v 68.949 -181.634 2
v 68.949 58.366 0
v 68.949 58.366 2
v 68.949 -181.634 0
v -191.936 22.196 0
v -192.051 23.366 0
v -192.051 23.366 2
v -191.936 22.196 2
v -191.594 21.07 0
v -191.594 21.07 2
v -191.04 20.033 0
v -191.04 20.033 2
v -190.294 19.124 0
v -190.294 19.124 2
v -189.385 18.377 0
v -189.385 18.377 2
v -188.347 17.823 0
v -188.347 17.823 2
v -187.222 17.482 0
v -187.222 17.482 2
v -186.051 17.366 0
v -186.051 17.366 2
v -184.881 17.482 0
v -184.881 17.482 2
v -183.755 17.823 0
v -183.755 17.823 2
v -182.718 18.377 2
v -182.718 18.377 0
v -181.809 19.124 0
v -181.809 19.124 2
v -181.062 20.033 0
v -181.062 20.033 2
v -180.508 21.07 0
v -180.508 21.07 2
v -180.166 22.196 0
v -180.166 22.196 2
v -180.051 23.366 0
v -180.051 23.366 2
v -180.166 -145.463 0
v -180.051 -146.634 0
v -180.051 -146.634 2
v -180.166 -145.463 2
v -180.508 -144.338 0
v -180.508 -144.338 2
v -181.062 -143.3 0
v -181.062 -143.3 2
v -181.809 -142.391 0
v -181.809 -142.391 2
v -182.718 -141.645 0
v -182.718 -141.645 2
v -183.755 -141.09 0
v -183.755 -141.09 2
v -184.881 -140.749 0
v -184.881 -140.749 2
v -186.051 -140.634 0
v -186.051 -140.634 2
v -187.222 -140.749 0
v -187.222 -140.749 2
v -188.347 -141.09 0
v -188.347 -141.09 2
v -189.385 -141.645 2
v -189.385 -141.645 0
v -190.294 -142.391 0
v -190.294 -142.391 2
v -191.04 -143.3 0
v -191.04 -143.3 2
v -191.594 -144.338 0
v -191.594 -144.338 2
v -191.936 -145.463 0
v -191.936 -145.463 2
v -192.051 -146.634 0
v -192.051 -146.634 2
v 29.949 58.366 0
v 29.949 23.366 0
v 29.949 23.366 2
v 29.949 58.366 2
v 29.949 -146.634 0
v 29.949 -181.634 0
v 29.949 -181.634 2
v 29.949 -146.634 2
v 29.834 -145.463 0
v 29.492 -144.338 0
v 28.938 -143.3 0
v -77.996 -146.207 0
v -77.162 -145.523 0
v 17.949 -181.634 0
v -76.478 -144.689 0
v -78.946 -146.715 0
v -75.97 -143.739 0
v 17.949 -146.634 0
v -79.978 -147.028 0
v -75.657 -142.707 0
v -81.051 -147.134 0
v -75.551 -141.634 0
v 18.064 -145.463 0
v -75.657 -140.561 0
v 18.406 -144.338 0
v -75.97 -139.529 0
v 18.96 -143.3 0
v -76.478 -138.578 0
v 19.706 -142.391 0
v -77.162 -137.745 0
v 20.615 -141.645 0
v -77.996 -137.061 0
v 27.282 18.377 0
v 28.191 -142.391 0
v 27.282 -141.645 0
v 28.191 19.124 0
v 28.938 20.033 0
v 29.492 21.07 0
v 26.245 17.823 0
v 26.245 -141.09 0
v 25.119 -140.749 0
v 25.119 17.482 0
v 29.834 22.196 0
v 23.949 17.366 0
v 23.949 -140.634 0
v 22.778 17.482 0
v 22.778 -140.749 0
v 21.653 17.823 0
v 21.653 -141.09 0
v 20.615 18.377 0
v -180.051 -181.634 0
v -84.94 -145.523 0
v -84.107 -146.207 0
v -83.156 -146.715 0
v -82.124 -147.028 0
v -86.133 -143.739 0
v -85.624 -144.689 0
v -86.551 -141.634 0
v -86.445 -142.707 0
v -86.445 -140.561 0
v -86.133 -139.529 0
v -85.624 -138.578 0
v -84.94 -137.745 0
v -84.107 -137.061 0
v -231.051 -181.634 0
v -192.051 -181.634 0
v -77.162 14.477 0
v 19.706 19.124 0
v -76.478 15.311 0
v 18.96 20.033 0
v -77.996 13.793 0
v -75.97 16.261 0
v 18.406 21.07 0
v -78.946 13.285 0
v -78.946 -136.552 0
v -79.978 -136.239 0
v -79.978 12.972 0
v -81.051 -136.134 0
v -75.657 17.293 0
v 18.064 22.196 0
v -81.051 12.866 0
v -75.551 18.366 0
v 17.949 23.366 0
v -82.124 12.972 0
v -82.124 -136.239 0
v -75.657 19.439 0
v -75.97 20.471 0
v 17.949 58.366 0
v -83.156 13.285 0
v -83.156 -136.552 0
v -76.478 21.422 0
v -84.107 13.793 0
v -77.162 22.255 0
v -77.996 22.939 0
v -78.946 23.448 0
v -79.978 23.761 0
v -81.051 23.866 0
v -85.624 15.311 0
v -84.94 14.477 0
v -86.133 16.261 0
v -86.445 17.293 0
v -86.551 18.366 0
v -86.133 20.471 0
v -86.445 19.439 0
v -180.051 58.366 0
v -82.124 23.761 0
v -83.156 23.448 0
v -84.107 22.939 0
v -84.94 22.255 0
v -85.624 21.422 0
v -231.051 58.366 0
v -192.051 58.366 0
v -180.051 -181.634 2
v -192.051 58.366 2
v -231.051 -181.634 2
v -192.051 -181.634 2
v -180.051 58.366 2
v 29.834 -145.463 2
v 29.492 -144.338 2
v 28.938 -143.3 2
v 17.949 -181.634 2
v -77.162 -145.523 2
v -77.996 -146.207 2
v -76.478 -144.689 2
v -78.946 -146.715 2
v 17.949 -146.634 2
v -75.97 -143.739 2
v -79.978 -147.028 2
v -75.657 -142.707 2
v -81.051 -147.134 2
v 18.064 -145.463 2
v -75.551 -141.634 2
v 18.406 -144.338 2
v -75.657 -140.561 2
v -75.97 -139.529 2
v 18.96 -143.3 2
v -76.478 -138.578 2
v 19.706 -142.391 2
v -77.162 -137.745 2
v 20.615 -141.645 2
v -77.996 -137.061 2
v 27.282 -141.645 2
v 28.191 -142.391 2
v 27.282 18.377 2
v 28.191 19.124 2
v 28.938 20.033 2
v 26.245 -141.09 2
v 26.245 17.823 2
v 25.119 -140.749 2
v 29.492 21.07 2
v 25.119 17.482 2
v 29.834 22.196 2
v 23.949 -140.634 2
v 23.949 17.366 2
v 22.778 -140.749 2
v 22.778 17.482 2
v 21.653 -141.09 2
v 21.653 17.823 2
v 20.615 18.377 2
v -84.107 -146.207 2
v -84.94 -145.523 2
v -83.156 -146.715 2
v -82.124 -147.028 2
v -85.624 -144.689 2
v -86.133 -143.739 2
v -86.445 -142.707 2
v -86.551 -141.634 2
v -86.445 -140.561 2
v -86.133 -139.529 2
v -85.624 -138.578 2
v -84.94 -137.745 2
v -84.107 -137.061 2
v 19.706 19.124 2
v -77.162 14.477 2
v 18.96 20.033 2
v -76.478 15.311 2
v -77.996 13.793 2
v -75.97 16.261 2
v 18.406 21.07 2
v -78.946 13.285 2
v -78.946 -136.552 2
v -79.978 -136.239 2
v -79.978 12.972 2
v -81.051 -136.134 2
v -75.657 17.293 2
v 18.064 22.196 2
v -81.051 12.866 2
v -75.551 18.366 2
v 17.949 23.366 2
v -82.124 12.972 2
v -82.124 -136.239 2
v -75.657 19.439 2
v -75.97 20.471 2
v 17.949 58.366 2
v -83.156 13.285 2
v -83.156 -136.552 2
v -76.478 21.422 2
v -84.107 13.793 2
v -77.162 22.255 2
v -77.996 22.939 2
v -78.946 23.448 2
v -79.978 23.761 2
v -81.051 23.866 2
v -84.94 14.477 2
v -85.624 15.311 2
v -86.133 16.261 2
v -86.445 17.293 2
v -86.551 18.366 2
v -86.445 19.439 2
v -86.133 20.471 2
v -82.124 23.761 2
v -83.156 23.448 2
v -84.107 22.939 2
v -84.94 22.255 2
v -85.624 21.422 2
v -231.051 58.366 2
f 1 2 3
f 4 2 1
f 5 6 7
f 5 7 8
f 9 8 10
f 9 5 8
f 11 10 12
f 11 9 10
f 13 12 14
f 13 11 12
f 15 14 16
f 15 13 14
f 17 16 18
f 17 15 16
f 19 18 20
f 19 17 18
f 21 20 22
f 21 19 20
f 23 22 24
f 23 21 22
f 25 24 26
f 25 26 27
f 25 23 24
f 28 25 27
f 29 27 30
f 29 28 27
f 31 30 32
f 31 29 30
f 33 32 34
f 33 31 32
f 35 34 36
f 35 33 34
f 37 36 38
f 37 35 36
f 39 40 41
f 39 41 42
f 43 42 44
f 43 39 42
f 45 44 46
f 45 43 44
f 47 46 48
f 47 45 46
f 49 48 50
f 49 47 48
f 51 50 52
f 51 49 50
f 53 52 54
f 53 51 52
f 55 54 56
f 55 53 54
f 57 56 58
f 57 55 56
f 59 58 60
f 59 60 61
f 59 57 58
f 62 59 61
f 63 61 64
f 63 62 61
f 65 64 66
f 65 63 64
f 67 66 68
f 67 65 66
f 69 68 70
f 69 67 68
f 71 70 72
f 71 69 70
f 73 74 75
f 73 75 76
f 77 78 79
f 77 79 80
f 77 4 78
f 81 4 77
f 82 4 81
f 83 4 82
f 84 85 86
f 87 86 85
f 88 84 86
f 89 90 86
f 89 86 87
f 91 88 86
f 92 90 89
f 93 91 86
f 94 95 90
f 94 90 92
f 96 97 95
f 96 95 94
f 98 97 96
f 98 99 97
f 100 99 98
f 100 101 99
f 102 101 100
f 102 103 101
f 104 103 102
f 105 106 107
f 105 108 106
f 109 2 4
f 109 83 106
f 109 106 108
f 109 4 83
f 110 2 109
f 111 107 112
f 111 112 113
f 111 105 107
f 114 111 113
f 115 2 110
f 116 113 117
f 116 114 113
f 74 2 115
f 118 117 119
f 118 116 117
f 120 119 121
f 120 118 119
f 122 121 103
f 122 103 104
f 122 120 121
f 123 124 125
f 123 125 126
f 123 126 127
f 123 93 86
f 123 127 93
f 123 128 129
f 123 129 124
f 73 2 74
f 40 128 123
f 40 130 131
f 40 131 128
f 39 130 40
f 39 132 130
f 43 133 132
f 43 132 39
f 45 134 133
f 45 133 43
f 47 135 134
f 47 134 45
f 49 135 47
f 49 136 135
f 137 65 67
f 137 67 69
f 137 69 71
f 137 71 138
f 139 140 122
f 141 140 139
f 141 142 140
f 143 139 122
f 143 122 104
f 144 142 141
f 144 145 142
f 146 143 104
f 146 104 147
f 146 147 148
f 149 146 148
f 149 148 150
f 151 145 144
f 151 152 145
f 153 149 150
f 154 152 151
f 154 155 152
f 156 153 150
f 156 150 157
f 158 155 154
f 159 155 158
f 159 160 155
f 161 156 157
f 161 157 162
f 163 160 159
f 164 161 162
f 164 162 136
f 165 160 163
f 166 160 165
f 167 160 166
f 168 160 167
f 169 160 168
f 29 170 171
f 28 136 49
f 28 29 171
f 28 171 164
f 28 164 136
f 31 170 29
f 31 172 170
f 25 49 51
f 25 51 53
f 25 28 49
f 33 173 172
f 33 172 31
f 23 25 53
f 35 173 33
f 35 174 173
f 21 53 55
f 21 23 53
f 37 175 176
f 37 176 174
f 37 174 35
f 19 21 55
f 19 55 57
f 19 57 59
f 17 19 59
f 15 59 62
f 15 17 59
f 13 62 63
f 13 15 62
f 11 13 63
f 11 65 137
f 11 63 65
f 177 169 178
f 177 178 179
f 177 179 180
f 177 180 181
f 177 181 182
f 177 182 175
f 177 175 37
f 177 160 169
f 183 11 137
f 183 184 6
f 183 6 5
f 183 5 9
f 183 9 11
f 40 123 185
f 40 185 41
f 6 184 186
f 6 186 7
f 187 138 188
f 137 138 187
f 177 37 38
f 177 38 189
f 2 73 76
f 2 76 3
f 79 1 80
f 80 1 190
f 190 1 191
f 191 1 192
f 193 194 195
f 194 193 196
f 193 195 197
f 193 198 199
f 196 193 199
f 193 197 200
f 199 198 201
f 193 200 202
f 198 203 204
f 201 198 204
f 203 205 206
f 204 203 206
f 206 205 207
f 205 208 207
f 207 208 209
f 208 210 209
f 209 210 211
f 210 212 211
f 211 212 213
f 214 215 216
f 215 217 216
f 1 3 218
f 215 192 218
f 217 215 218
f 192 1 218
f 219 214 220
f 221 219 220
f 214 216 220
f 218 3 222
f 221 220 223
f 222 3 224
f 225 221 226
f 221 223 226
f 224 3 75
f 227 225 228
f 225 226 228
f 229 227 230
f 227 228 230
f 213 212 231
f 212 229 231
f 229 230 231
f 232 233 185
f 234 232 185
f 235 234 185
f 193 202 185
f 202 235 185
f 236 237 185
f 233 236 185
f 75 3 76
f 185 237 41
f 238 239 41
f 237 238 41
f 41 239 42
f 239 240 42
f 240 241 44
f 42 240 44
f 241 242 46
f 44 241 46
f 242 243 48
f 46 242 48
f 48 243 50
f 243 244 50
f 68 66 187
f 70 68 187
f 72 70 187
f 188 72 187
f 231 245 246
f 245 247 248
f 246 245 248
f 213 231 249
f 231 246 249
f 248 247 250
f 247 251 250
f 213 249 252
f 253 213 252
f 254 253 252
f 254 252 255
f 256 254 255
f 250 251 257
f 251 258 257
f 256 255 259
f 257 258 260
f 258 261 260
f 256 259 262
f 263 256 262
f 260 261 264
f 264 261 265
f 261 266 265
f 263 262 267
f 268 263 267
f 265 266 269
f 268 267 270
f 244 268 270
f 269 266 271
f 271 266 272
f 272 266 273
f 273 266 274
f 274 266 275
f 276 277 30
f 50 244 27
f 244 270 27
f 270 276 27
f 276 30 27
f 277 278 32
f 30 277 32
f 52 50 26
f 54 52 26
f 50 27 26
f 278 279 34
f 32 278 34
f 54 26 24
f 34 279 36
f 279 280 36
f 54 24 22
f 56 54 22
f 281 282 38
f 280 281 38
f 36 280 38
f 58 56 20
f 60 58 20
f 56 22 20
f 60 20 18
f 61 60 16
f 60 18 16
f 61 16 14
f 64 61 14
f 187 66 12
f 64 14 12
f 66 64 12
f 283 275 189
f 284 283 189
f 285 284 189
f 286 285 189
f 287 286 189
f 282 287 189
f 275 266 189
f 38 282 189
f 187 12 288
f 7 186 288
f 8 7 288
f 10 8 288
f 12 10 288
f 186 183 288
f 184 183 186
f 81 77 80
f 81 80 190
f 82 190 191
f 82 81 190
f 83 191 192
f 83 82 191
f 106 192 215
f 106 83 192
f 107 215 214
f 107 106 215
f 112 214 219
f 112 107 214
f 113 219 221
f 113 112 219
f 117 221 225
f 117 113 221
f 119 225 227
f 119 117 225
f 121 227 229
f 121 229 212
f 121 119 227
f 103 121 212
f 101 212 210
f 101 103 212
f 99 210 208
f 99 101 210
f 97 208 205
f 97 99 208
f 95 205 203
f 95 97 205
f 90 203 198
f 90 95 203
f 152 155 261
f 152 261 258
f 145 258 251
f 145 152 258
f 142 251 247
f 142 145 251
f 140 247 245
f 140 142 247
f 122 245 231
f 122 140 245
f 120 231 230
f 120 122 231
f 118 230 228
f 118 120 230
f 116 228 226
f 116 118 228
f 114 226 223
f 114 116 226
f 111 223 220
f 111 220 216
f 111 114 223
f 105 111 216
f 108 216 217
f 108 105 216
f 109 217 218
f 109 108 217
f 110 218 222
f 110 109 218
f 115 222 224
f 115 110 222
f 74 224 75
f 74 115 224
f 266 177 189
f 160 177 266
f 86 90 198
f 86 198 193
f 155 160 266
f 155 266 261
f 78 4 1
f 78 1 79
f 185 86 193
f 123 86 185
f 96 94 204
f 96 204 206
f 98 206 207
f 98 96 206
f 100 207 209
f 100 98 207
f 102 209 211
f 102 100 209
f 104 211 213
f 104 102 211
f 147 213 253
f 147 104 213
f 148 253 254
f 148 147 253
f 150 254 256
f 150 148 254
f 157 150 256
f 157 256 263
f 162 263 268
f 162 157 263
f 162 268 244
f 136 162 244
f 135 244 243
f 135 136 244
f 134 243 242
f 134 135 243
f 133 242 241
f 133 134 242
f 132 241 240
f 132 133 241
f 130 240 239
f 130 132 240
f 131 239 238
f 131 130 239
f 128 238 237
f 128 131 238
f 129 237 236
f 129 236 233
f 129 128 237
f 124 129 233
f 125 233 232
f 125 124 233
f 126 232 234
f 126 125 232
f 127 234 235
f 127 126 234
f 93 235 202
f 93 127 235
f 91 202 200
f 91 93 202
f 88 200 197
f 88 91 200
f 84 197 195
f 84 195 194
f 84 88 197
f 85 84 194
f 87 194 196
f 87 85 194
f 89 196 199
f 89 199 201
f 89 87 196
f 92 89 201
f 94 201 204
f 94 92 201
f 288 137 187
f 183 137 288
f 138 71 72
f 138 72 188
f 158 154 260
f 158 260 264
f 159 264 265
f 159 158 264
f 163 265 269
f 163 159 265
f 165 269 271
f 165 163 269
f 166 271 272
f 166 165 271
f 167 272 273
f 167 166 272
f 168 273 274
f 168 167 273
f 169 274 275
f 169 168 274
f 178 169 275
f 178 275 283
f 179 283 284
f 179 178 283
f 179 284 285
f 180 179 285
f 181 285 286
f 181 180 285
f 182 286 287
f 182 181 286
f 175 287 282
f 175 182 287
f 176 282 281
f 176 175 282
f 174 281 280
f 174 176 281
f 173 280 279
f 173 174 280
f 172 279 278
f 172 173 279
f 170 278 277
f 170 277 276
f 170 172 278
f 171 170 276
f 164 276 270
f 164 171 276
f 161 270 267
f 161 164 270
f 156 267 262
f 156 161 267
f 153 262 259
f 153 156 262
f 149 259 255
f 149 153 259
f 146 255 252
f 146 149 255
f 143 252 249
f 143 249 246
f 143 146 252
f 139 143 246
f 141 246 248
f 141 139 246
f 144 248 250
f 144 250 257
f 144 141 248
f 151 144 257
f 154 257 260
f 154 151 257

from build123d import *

# Parameters (mm, degrees)
SKETCH1_R               = 5.5
SKETCH1_R_2             = 3.25
BOSS_EXTRUDE1_DEPTH     = 2
CUT_EXTRUDE1_DEPTH      = 319.029152687
CUT_EXTRUDE1_DEPTH_BACK = 319.029152687
SKETCH2_W               = 30
SKETCH2_H               = 70
CUT_EXTRUDE2_DEPTH      = 319.029152687
CUT_EXTRUDE2_DEPTH_BACK = 319.029152687
SKETCH3_W               = 30
SKETCH3_H               = 70


with BuildPart() as part:
    # Sketch1 → Boss-Extrude1 (new body)
    with BuildSketch(Plane.XY):
        with BuildLine():
            Line((68.948821818, -26.633764286), (98.948821818, -26.633764286))
            Line((98.948821818, -26.633764286), (98.948821818, -96.633764286))
            Line((98.948821818, -96.633764286), (68.948821818, -96.633764286))
            Line((68.948821818, -96.633764286), (68.948821818, -181.633764286))
            Line((68.948821818, -181.633764286), (29.948821818, -181.633764286))
            Line((29.948821818, -181.633764286), (29.948821818, -146.633764286))
            ThreePointArc((29.948821818, -146.633764286), (23.948821818, -140.633764286), (17.948821818, -146.633764286))
            Line((17.948821818, -146.633764286), (17.948821818, -181.633764286))
            Line((17.948821818, -181.633764286), (-180.051178182, -181.633764286))
            Line((-180.051178182, -181.633764286), (-180.051178182, -146.633764286))
            ThreePointArc((-180.051178182, -146.633764286), (-186.051178182, -140.633764286), (-192.051178182, -146.633764286))
            Line((-192.051178182, -146.633764286), (-192.051178182, -181.633764286))
            Line((-192.051178182, -181.633764286), (-231.051178182, -181.633764286))
            Line((-231.051178182, -181.633764286), (-231.051178182, -100.179856115))
            Line((-231.051178182, -100.179856115), (-261.051178182, -100.179856115))
            Line((-261.051178182, -100.179856115), (-261.051178182, -30.179856115))
            Line((-261.051178182, -30.179856115), (-231.051178182, -30.179856115))
            Line((-231.051178182, -30.179856115), (-231.051178182, 58.366235714))
            Line((-231.051178182, 58.366235714), (-192.051178182, 58.366235714))
            Line((-192.051178182, 58.366235714), (-192.051178182, 23.366235714))
            ThreePointArc((-192.051178182, 23.366235714), (-186.051178182, 17.366235714), (-180.051178182, 23.366235714))
            Line((-180.051178182, 23.366235714), (-180.051178182, 58.366235714))
            Line((-180.051178182, 58.366235714), (17.948821818, 58.366235714))
            Line((17.948821818, 58.366235714), (17.948821818, 23.366235714))
            ThreePointArc((17.948821818, 23.366235714), (23.948821818, 17.366235714), (29.948821818, 23.366235714))
            Line((29.948821818, 23.366235714), (29.948821818, 58.366235714))
            Line((29.948821818, 58.366235714), (68.948821818, 58.366235714))
            Line((68.948821818, 58.366235714), (68.948821818, -26.633764286))
        make_face()
        with Locations((-81.051178182, -141.633764286)):
            Circle(SKETCH1_R, mode=Mode.SUBTRACT)
        with Locations((-81.051178182, 18.366235714)):
            Circle(SKETCH1_R, mode=Mode.SUBTRACT)
        with Locations((83.948821818, -61.633764286)):
            Circle(SKETCH1_R_2, mode=Mode.SUBTRACT)
        with Locations((-246.051178182, -65.179856115)):
            Circle(SKETCH1_R_2, mode=Mode.SUBTRACT)
    extrude(amount=BOSS_EXTRUDE1_DEPTH)

    # Sketch2 → Cut-Extrude1 (cut, two sides: drawn at the far end of the back side and taken through both)
    with BuildSketch(Plane.XY.offset(2).offset(-CUT_EXTRUDE1_DEPTH_BACK)):
        with Locations((83.948821818, -61.633764286)):
            Rectangle(SKETCH2_W, SKETCH2_H)
    extrude(amount=CUT_EXTRUDE1_DEPTH + CUT_EXTRUDE1_DEPTH_BACK, mode=Mode.SUBTRACT)

    # Sketch3 → Cut-Extrude2 (cut, two sides: drawn at the far end of the back side and taken through both)
    with BuildSketch(Plane.XY.offset(2).offset(-CUT_EXTRUDE2_DEPTH_BACK)):
        with Locations((-246.051178182, -65.179856115)):
            Rectangle(SKETCH3_W, SKETCH3_H)
    extrude(amount=CUT_EXTRUDE2_DEPTH + CUT_EXTRUDE2_DEPTH_BACK, mode=Mode.SUBTRACT)


solid = part.part
